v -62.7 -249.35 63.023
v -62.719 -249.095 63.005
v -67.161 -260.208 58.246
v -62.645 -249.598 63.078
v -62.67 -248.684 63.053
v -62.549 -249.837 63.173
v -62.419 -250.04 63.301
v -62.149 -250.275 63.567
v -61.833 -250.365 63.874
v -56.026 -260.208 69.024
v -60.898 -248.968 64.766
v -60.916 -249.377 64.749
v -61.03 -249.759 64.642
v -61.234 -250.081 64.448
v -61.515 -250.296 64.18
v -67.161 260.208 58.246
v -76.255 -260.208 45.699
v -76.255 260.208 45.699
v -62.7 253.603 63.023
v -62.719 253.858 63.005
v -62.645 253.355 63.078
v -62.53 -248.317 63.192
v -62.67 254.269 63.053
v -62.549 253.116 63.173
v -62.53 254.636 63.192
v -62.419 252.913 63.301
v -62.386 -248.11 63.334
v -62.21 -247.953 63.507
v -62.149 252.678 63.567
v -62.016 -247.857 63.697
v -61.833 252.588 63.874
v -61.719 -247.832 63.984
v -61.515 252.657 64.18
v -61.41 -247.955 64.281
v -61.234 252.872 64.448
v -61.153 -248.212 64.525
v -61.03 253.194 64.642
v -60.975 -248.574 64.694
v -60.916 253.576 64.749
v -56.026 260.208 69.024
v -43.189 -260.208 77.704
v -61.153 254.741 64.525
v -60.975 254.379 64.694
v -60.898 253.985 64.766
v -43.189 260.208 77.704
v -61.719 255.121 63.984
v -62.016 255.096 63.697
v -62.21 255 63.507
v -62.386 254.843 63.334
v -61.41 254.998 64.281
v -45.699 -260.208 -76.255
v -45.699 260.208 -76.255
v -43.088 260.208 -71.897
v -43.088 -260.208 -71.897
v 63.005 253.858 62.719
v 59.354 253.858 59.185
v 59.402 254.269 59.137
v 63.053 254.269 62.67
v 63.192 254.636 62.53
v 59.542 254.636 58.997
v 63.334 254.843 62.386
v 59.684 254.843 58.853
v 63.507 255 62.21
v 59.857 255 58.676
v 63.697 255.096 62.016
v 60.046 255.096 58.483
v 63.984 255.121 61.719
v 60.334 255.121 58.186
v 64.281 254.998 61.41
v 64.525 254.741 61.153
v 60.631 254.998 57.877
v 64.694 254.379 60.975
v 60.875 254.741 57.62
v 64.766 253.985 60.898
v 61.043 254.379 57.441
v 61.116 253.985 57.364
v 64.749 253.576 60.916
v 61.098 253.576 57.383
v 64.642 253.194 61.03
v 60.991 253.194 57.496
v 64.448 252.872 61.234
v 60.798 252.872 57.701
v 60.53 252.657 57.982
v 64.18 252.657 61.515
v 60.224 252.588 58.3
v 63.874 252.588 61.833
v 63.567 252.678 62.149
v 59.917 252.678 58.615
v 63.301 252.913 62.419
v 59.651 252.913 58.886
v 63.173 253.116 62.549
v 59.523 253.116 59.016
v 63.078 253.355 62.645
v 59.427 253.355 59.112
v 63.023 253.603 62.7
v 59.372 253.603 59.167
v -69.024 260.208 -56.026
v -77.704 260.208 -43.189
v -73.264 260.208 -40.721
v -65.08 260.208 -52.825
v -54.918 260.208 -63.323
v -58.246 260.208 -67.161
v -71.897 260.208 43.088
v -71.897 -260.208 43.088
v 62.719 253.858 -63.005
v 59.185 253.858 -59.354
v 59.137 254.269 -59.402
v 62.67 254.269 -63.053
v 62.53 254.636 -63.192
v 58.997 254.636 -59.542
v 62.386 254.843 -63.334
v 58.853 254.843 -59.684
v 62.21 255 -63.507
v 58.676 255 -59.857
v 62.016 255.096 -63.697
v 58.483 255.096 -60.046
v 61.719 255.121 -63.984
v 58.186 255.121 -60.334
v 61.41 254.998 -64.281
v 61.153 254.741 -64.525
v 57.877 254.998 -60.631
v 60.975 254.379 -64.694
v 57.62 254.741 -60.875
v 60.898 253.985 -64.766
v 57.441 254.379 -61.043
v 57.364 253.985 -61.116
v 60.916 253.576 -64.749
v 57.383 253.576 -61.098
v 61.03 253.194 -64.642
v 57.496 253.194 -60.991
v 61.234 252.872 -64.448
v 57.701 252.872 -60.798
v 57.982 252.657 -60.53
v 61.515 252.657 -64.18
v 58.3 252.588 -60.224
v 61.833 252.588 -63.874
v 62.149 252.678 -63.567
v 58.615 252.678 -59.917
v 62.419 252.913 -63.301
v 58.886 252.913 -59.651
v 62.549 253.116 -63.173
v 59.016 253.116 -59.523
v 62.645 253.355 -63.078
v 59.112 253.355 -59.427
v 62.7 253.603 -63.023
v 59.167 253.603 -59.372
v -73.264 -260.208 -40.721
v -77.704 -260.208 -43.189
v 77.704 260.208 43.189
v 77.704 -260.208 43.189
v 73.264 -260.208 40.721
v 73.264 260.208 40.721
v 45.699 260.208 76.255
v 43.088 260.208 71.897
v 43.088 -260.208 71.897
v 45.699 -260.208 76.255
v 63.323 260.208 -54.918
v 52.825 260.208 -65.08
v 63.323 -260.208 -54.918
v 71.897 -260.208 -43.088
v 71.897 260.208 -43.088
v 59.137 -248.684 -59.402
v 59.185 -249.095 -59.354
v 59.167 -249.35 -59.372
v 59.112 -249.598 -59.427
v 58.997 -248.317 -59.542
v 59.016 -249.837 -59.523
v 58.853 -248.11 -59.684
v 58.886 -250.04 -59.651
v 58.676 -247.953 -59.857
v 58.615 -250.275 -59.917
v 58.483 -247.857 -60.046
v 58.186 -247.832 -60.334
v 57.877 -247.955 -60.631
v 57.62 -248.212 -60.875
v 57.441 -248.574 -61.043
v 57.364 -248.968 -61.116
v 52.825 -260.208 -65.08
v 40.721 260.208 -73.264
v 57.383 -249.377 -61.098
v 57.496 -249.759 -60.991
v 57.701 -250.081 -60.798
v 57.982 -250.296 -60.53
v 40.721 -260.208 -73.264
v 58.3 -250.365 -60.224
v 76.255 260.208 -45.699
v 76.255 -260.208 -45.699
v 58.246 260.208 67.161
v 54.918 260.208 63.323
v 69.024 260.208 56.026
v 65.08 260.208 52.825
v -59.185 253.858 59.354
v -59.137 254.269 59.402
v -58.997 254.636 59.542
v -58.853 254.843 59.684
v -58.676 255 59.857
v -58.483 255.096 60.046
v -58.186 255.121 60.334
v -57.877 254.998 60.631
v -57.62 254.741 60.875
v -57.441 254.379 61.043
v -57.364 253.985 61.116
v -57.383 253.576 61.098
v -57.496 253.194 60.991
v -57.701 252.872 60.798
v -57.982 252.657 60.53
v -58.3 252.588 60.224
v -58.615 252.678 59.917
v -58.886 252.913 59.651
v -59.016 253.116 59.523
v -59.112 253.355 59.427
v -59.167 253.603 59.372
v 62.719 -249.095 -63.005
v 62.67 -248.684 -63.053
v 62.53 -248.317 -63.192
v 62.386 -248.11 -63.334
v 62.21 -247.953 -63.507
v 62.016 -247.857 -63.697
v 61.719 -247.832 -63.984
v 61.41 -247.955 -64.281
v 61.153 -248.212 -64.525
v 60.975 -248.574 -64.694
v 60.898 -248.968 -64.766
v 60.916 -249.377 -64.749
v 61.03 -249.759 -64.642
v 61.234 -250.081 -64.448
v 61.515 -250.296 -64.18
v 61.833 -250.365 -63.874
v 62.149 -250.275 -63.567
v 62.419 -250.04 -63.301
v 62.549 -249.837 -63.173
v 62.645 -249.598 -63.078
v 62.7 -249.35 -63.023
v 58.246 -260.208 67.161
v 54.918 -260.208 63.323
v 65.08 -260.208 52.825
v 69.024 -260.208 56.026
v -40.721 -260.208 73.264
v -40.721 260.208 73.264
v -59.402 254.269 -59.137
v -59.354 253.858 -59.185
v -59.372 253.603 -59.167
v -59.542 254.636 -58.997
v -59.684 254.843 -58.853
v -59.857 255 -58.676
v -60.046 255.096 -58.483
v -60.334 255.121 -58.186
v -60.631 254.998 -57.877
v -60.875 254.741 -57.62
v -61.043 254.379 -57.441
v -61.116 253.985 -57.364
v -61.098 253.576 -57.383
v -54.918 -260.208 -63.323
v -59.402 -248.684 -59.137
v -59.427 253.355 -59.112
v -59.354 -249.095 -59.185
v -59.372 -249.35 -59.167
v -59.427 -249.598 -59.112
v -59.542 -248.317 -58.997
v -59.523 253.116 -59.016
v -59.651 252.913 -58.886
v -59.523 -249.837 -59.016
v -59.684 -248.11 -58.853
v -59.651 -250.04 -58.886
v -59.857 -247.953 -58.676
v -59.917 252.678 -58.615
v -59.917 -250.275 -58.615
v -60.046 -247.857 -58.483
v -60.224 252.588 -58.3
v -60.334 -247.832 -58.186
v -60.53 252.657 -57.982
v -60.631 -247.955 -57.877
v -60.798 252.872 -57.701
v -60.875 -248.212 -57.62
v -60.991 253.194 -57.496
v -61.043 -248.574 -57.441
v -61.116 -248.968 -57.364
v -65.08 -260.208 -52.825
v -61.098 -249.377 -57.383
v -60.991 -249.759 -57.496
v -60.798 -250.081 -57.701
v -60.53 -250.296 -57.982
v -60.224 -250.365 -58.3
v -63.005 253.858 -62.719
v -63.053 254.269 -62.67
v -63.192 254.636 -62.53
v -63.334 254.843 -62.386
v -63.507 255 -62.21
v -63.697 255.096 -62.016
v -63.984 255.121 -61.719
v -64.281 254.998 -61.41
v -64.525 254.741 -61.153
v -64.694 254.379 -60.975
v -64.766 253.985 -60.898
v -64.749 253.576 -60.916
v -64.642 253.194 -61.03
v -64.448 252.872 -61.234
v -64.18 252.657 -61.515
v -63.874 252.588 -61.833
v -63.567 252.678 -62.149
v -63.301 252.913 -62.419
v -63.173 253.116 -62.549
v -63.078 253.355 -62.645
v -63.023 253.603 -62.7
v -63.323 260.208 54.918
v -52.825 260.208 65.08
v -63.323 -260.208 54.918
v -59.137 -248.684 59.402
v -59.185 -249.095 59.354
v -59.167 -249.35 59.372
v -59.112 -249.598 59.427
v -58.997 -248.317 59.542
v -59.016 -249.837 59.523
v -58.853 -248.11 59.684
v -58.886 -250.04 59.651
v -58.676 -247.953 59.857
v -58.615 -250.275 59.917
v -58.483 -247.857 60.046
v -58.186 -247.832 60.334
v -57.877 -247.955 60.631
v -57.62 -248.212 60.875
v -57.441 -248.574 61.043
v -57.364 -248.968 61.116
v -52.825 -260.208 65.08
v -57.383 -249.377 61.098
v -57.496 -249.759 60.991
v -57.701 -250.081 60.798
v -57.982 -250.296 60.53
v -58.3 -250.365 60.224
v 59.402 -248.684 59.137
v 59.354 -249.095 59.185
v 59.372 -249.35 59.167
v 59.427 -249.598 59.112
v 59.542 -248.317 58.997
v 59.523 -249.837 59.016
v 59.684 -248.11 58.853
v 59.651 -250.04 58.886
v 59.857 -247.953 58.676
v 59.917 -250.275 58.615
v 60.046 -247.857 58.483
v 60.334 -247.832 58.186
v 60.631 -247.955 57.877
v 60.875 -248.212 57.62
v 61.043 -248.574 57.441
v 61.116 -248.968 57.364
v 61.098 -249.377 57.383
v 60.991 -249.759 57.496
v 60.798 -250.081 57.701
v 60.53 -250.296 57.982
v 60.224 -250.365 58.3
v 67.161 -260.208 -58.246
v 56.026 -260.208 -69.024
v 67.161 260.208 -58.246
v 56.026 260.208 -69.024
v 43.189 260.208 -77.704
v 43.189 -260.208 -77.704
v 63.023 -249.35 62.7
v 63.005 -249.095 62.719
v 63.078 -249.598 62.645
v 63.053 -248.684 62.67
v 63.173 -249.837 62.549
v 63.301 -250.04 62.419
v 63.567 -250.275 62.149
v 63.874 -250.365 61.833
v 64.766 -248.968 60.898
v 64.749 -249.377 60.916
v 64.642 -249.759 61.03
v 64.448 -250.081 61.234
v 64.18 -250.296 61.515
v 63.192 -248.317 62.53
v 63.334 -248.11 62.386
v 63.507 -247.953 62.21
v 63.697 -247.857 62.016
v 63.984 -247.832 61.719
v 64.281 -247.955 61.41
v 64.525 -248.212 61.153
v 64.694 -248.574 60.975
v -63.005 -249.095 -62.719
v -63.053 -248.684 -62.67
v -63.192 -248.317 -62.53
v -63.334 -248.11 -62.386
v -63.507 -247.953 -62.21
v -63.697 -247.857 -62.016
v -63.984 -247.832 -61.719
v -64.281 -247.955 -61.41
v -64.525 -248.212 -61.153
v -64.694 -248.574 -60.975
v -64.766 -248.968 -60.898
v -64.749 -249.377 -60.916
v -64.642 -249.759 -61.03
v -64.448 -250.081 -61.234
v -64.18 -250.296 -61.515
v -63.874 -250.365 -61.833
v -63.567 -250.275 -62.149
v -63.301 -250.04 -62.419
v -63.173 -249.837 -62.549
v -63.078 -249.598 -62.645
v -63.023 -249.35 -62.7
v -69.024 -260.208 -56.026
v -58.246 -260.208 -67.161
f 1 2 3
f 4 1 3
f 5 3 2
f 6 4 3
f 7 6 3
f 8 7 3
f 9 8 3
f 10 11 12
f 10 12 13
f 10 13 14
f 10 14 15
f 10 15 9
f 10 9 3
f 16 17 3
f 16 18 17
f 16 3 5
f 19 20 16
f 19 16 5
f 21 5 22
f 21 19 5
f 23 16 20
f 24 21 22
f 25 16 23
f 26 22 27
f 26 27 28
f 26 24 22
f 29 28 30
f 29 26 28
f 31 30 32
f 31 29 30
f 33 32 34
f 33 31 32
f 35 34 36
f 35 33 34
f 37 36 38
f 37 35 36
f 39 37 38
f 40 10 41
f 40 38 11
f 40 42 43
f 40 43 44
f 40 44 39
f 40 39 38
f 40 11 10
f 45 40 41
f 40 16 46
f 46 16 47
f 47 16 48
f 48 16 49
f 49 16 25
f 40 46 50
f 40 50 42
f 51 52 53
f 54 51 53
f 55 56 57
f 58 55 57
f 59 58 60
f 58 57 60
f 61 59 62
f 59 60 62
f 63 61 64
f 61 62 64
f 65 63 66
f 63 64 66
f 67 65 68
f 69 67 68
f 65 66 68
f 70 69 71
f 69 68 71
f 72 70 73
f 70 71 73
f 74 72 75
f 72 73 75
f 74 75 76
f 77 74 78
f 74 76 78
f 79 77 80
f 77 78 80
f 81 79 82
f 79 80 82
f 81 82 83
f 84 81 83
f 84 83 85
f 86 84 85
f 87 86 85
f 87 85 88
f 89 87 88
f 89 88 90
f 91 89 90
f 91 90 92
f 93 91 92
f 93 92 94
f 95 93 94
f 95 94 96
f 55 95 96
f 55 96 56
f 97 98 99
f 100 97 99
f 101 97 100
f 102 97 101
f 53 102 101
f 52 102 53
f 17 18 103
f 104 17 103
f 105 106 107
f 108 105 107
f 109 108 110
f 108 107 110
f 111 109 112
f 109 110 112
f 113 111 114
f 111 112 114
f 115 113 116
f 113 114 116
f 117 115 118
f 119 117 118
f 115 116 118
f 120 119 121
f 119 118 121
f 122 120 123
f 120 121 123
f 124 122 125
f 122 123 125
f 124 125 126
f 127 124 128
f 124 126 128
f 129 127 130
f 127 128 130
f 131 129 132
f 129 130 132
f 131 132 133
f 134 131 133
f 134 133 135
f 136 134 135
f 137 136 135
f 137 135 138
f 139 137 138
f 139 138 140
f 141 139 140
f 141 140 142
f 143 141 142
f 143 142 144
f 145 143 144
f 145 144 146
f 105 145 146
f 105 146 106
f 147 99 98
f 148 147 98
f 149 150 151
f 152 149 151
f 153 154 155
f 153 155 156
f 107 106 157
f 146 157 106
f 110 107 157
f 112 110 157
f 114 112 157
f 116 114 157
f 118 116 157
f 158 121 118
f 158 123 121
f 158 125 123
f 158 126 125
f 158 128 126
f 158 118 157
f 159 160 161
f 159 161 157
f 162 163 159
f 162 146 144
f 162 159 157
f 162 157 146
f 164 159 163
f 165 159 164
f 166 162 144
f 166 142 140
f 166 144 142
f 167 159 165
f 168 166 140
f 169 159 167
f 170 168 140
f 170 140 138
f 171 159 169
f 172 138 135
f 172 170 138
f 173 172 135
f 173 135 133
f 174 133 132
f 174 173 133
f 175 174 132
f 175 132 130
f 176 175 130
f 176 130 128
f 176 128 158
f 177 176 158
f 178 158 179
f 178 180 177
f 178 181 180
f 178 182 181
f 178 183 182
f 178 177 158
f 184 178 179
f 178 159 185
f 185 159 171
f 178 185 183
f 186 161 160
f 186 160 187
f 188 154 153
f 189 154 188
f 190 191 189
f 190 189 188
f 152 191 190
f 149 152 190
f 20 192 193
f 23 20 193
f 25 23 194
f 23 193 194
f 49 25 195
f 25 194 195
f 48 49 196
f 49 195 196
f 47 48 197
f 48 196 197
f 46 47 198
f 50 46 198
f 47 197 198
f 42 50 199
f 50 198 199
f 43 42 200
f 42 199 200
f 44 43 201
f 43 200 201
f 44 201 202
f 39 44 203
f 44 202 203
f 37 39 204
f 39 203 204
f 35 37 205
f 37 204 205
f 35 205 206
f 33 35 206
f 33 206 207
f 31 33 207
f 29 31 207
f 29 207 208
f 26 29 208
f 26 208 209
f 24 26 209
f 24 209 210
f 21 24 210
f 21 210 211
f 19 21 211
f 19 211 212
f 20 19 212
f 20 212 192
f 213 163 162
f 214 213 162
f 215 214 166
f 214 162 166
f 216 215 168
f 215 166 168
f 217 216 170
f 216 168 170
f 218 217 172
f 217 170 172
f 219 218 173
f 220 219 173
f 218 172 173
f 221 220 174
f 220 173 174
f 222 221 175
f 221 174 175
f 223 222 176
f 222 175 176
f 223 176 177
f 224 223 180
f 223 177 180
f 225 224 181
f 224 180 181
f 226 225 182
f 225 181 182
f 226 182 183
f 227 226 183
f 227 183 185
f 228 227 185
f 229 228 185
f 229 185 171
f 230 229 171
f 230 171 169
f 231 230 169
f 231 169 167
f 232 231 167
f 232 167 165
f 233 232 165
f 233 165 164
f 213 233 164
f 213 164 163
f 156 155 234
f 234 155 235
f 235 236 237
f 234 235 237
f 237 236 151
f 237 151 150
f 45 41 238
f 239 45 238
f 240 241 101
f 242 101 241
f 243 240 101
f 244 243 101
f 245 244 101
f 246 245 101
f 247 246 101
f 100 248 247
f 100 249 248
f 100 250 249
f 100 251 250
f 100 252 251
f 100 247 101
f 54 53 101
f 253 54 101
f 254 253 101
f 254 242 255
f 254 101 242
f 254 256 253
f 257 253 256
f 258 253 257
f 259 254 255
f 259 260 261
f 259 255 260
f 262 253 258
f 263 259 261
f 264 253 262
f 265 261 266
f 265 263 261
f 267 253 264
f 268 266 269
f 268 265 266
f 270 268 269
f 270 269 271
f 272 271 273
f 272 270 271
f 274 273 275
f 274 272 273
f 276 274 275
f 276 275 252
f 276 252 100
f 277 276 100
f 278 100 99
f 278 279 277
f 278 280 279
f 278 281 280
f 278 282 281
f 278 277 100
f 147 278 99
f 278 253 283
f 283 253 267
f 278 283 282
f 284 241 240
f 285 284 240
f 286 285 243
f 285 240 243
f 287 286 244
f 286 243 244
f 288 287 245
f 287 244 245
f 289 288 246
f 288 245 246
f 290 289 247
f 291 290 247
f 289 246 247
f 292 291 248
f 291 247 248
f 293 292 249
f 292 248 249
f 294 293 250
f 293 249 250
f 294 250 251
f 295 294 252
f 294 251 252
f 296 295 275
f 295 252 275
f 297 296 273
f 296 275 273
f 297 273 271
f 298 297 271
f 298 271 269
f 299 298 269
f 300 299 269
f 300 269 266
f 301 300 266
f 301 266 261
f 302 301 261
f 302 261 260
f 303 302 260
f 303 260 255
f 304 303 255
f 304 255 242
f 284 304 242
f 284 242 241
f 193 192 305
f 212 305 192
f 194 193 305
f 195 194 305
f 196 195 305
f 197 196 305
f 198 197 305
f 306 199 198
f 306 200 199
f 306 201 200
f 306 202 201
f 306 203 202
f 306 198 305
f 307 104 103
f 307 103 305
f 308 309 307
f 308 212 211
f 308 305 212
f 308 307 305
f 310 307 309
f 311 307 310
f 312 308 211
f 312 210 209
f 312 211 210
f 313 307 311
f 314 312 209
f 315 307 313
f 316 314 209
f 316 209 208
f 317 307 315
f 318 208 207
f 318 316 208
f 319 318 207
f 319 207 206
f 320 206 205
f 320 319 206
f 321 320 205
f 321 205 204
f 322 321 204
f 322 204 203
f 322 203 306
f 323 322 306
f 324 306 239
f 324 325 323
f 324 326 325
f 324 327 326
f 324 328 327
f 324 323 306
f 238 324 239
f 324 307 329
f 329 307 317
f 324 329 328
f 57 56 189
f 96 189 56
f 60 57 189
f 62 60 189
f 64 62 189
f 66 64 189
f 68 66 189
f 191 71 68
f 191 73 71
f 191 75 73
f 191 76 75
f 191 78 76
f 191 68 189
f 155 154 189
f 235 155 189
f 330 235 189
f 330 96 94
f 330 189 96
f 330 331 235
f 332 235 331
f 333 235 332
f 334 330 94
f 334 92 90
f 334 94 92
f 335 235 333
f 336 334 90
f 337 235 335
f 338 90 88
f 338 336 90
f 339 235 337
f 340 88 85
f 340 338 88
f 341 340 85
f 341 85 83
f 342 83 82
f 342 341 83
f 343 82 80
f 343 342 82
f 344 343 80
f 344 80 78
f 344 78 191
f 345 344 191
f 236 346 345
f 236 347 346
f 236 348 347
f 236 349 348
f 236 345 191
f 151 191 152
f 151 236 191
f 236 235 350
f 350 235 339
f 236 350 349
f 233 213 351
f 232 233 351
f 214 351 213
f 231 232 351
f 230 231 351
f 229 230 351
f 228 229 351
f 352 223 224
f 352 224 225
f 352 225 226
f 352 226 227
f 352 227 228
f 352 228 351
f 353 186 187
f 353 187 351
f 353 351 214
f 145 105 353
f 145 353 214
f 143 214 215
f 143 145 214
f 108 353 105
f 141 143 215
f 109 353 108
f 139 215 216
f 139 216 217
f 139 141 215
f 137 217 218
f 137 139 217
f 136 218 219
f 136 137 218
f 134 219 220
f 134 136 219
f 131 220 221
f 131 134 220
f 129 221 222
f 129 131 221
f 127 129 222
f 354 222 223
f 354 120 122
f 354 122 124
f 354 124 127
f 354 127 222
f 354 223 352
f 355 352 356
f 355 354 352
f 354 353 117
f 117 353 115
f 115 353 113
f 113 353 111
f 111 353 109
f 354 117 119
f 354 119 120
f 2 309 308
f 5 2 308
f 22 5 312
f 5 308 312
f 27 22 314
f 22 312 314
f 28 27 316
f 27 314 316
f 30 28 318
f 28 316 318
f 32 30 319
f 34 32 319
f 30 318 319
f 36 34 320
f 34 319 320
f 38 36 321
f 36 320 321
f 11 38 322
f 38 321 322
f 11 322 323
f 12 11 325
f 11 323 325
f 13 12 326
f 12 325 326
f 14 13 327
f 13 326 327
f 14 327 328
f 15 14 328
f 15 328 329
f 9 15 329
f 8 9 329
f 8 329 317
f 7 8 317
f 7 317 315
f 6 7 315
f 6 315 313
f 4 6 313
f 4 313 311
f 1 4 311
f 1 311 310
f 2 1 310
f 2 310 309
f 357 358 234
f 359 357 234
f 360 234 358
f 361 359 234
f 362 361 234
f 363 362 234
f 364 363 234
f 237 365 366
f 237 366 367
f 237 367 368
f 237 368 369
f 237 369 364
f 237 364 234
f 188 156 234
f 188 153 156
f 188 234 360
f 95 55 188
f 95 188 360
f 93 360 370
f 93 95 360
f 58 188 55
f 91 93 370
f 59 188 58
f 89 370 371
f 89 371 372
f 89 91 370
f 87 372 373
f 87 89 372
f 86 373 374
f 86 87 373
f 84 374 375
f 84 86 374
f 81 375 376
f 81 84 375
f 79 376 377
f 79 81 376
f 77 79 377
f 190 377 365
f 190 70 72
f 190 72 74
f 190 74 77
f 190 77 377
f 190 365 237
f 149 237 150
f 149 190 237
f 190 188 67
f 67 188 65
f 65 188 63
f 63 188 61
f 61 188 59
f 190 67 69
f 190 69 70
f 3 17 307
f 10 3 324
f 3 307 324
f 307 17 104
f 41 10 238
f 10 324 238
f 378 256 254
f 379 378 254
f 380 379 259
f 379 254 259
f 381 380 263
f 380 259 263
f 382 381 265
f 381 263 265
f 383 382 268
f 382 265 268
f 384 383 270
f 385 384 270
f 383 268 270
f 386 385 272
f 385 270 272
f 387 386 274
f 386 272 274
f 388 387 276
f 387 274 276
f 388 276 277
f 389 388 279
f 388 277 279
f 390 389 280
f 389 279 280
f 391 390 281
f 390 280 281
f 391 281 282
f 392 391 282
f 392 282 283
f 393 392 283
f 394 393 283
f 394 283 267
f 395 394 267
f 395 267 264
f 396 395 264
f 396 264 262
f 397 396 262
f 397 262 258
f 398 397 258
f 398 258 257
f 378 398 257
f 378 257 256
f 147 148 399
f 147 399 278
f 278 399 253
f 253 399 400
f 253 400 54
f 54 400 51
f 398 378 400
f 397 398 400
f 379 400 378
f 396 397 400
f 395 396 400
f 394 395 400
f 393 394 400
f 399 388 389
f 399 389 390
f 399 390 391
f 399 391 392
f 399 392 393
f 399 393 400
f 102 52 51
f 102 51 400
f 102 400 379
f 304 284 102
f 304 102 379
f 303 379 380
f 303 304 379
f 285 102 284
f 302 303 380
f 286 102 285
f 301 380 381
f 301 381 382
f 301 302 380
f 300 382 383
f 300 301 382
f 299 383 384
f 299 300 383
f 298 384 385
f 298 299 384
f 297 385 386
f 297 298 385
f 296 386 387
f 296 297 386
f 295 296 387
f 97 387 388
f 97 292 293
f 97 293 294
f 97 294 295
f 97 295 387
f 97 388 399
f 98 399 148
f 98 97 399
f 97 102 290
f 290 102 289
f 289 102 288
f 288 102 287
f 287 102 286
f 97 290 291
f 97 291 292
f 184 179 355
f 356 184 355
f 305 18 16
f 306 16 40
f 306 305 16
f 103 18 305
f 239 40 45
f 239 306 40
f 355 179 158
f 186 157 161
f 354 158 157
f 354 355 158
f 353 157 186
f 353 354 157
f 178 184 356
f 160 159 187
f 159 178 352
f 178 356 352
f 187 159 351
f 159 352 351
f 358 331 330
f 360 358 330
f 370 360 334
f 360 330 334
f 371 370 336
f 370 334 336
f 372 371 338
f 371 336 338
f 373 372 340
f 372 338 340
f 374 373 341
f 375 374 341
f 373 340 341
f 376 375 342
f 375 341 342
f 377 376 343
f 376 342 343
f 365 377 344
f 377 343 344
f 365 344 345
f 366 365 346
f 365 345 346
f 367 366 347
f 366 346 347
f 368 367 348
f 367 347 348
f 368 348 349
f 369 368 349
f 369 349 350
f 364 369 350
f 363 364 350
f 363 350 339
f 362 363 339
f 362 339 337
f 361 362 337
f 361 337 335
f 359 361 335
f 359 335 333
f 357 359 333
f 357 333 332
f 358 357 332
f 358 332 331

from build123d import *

# Parameters (mm, degrees)
SKETCH2_R               = 88.9
SKETCH2_R_2             = 83.82
BOSS_EXTRUDE1_DEPTH     = 260.20776
CUT_EXTRUDE1_DEPTH      = 261.20776
CUT_EXTRUDE1_DEPTH_BACK = 261.20776
SKETCH5_R               = 1.27
BOLT_HOLES_DEPTH        = 29.911624556
BOLT_PATTERN_COUNT      = 4


with BuildPart() as part:
    # Sketch2 → Boss-Extrude1 (new body, symmetric)
    with BuildSketch(Plane(origin=(0, 0, 0), x_dir=(1, 0, 0), z_dir=(0, 1, 0))):
        Circle(SKETCH2_R)
        Circle(SKETCH2_R_2, mode=Mode.SUBTRACT)
    extrude(amount=BOSS_EXTRUDE1_DEPTH, both=True)

    # Sketch3 → Cut-Extrude1 (cut, two sides)
    with BuildSketch(Plane(origin=(0, 0, 0), x_dir=(1, 0, 0), z_dir=(0, 1, 0))) as cut_extrude1_sk:
        Polygon((169.661755759, -94.300371224), (0, 0), (169.661755759, 101.677593364), align=None)
        Polygon((0, 0), (53.900027233, 96.974944394), (-58.116685864, 96.974944394), align=None)
        Polygon((-123.741299607, 68.777140945), (-123.741299607, -74.157652604), (0, 0), align=None)
        Polygon((-65.840936026, -118.45858783), (0, 0), (70.991745134, -118.45858783), align=None)
    extrude(amount=CUT_EXTRUDE1_DEPTH, mode=Mode.SUBTRACT)
    extrude(cut_extrude1_sk.sketch, amount=-CUT_EXTRUDE1_DEPTH_BACK, mode=Mode.SUBTRACT)

    # Sketch5 → Bolt holes (cut, through all)
    with BuildSketch(Plane(origin=(-56.309218645, 0, 58.175814955), x_dir=(-0.718540152, 0, -0.695485478), z_dir=(0.695485478, 0, -0.718540152))):
        with Locations((-0.02278764, 253.85776)):
            Circle(SKETCH5_R)
        with Locations((-0.02278764, -249.09526)):
            Circle(SKETCH5_R)
    bolt_holes = extrude(amount=-BOLT_HOLES_DEPTH, mode=Mode.SUBTRACT)

    # Bolt pattern: Bolt holes ×4 about axis
    bolt_pattern_axis = Axis((0, 260.20776, 0), (0, 1, 0))
    for i in range(1, BOLT_PATTERN_COUNT):
        add(bolt_holes.rotate(bolt_pattern_axis, i * 360 / BOLT_PATTERN_COUNT), mode=Mode.SUBTRACT)


solid = part.part
